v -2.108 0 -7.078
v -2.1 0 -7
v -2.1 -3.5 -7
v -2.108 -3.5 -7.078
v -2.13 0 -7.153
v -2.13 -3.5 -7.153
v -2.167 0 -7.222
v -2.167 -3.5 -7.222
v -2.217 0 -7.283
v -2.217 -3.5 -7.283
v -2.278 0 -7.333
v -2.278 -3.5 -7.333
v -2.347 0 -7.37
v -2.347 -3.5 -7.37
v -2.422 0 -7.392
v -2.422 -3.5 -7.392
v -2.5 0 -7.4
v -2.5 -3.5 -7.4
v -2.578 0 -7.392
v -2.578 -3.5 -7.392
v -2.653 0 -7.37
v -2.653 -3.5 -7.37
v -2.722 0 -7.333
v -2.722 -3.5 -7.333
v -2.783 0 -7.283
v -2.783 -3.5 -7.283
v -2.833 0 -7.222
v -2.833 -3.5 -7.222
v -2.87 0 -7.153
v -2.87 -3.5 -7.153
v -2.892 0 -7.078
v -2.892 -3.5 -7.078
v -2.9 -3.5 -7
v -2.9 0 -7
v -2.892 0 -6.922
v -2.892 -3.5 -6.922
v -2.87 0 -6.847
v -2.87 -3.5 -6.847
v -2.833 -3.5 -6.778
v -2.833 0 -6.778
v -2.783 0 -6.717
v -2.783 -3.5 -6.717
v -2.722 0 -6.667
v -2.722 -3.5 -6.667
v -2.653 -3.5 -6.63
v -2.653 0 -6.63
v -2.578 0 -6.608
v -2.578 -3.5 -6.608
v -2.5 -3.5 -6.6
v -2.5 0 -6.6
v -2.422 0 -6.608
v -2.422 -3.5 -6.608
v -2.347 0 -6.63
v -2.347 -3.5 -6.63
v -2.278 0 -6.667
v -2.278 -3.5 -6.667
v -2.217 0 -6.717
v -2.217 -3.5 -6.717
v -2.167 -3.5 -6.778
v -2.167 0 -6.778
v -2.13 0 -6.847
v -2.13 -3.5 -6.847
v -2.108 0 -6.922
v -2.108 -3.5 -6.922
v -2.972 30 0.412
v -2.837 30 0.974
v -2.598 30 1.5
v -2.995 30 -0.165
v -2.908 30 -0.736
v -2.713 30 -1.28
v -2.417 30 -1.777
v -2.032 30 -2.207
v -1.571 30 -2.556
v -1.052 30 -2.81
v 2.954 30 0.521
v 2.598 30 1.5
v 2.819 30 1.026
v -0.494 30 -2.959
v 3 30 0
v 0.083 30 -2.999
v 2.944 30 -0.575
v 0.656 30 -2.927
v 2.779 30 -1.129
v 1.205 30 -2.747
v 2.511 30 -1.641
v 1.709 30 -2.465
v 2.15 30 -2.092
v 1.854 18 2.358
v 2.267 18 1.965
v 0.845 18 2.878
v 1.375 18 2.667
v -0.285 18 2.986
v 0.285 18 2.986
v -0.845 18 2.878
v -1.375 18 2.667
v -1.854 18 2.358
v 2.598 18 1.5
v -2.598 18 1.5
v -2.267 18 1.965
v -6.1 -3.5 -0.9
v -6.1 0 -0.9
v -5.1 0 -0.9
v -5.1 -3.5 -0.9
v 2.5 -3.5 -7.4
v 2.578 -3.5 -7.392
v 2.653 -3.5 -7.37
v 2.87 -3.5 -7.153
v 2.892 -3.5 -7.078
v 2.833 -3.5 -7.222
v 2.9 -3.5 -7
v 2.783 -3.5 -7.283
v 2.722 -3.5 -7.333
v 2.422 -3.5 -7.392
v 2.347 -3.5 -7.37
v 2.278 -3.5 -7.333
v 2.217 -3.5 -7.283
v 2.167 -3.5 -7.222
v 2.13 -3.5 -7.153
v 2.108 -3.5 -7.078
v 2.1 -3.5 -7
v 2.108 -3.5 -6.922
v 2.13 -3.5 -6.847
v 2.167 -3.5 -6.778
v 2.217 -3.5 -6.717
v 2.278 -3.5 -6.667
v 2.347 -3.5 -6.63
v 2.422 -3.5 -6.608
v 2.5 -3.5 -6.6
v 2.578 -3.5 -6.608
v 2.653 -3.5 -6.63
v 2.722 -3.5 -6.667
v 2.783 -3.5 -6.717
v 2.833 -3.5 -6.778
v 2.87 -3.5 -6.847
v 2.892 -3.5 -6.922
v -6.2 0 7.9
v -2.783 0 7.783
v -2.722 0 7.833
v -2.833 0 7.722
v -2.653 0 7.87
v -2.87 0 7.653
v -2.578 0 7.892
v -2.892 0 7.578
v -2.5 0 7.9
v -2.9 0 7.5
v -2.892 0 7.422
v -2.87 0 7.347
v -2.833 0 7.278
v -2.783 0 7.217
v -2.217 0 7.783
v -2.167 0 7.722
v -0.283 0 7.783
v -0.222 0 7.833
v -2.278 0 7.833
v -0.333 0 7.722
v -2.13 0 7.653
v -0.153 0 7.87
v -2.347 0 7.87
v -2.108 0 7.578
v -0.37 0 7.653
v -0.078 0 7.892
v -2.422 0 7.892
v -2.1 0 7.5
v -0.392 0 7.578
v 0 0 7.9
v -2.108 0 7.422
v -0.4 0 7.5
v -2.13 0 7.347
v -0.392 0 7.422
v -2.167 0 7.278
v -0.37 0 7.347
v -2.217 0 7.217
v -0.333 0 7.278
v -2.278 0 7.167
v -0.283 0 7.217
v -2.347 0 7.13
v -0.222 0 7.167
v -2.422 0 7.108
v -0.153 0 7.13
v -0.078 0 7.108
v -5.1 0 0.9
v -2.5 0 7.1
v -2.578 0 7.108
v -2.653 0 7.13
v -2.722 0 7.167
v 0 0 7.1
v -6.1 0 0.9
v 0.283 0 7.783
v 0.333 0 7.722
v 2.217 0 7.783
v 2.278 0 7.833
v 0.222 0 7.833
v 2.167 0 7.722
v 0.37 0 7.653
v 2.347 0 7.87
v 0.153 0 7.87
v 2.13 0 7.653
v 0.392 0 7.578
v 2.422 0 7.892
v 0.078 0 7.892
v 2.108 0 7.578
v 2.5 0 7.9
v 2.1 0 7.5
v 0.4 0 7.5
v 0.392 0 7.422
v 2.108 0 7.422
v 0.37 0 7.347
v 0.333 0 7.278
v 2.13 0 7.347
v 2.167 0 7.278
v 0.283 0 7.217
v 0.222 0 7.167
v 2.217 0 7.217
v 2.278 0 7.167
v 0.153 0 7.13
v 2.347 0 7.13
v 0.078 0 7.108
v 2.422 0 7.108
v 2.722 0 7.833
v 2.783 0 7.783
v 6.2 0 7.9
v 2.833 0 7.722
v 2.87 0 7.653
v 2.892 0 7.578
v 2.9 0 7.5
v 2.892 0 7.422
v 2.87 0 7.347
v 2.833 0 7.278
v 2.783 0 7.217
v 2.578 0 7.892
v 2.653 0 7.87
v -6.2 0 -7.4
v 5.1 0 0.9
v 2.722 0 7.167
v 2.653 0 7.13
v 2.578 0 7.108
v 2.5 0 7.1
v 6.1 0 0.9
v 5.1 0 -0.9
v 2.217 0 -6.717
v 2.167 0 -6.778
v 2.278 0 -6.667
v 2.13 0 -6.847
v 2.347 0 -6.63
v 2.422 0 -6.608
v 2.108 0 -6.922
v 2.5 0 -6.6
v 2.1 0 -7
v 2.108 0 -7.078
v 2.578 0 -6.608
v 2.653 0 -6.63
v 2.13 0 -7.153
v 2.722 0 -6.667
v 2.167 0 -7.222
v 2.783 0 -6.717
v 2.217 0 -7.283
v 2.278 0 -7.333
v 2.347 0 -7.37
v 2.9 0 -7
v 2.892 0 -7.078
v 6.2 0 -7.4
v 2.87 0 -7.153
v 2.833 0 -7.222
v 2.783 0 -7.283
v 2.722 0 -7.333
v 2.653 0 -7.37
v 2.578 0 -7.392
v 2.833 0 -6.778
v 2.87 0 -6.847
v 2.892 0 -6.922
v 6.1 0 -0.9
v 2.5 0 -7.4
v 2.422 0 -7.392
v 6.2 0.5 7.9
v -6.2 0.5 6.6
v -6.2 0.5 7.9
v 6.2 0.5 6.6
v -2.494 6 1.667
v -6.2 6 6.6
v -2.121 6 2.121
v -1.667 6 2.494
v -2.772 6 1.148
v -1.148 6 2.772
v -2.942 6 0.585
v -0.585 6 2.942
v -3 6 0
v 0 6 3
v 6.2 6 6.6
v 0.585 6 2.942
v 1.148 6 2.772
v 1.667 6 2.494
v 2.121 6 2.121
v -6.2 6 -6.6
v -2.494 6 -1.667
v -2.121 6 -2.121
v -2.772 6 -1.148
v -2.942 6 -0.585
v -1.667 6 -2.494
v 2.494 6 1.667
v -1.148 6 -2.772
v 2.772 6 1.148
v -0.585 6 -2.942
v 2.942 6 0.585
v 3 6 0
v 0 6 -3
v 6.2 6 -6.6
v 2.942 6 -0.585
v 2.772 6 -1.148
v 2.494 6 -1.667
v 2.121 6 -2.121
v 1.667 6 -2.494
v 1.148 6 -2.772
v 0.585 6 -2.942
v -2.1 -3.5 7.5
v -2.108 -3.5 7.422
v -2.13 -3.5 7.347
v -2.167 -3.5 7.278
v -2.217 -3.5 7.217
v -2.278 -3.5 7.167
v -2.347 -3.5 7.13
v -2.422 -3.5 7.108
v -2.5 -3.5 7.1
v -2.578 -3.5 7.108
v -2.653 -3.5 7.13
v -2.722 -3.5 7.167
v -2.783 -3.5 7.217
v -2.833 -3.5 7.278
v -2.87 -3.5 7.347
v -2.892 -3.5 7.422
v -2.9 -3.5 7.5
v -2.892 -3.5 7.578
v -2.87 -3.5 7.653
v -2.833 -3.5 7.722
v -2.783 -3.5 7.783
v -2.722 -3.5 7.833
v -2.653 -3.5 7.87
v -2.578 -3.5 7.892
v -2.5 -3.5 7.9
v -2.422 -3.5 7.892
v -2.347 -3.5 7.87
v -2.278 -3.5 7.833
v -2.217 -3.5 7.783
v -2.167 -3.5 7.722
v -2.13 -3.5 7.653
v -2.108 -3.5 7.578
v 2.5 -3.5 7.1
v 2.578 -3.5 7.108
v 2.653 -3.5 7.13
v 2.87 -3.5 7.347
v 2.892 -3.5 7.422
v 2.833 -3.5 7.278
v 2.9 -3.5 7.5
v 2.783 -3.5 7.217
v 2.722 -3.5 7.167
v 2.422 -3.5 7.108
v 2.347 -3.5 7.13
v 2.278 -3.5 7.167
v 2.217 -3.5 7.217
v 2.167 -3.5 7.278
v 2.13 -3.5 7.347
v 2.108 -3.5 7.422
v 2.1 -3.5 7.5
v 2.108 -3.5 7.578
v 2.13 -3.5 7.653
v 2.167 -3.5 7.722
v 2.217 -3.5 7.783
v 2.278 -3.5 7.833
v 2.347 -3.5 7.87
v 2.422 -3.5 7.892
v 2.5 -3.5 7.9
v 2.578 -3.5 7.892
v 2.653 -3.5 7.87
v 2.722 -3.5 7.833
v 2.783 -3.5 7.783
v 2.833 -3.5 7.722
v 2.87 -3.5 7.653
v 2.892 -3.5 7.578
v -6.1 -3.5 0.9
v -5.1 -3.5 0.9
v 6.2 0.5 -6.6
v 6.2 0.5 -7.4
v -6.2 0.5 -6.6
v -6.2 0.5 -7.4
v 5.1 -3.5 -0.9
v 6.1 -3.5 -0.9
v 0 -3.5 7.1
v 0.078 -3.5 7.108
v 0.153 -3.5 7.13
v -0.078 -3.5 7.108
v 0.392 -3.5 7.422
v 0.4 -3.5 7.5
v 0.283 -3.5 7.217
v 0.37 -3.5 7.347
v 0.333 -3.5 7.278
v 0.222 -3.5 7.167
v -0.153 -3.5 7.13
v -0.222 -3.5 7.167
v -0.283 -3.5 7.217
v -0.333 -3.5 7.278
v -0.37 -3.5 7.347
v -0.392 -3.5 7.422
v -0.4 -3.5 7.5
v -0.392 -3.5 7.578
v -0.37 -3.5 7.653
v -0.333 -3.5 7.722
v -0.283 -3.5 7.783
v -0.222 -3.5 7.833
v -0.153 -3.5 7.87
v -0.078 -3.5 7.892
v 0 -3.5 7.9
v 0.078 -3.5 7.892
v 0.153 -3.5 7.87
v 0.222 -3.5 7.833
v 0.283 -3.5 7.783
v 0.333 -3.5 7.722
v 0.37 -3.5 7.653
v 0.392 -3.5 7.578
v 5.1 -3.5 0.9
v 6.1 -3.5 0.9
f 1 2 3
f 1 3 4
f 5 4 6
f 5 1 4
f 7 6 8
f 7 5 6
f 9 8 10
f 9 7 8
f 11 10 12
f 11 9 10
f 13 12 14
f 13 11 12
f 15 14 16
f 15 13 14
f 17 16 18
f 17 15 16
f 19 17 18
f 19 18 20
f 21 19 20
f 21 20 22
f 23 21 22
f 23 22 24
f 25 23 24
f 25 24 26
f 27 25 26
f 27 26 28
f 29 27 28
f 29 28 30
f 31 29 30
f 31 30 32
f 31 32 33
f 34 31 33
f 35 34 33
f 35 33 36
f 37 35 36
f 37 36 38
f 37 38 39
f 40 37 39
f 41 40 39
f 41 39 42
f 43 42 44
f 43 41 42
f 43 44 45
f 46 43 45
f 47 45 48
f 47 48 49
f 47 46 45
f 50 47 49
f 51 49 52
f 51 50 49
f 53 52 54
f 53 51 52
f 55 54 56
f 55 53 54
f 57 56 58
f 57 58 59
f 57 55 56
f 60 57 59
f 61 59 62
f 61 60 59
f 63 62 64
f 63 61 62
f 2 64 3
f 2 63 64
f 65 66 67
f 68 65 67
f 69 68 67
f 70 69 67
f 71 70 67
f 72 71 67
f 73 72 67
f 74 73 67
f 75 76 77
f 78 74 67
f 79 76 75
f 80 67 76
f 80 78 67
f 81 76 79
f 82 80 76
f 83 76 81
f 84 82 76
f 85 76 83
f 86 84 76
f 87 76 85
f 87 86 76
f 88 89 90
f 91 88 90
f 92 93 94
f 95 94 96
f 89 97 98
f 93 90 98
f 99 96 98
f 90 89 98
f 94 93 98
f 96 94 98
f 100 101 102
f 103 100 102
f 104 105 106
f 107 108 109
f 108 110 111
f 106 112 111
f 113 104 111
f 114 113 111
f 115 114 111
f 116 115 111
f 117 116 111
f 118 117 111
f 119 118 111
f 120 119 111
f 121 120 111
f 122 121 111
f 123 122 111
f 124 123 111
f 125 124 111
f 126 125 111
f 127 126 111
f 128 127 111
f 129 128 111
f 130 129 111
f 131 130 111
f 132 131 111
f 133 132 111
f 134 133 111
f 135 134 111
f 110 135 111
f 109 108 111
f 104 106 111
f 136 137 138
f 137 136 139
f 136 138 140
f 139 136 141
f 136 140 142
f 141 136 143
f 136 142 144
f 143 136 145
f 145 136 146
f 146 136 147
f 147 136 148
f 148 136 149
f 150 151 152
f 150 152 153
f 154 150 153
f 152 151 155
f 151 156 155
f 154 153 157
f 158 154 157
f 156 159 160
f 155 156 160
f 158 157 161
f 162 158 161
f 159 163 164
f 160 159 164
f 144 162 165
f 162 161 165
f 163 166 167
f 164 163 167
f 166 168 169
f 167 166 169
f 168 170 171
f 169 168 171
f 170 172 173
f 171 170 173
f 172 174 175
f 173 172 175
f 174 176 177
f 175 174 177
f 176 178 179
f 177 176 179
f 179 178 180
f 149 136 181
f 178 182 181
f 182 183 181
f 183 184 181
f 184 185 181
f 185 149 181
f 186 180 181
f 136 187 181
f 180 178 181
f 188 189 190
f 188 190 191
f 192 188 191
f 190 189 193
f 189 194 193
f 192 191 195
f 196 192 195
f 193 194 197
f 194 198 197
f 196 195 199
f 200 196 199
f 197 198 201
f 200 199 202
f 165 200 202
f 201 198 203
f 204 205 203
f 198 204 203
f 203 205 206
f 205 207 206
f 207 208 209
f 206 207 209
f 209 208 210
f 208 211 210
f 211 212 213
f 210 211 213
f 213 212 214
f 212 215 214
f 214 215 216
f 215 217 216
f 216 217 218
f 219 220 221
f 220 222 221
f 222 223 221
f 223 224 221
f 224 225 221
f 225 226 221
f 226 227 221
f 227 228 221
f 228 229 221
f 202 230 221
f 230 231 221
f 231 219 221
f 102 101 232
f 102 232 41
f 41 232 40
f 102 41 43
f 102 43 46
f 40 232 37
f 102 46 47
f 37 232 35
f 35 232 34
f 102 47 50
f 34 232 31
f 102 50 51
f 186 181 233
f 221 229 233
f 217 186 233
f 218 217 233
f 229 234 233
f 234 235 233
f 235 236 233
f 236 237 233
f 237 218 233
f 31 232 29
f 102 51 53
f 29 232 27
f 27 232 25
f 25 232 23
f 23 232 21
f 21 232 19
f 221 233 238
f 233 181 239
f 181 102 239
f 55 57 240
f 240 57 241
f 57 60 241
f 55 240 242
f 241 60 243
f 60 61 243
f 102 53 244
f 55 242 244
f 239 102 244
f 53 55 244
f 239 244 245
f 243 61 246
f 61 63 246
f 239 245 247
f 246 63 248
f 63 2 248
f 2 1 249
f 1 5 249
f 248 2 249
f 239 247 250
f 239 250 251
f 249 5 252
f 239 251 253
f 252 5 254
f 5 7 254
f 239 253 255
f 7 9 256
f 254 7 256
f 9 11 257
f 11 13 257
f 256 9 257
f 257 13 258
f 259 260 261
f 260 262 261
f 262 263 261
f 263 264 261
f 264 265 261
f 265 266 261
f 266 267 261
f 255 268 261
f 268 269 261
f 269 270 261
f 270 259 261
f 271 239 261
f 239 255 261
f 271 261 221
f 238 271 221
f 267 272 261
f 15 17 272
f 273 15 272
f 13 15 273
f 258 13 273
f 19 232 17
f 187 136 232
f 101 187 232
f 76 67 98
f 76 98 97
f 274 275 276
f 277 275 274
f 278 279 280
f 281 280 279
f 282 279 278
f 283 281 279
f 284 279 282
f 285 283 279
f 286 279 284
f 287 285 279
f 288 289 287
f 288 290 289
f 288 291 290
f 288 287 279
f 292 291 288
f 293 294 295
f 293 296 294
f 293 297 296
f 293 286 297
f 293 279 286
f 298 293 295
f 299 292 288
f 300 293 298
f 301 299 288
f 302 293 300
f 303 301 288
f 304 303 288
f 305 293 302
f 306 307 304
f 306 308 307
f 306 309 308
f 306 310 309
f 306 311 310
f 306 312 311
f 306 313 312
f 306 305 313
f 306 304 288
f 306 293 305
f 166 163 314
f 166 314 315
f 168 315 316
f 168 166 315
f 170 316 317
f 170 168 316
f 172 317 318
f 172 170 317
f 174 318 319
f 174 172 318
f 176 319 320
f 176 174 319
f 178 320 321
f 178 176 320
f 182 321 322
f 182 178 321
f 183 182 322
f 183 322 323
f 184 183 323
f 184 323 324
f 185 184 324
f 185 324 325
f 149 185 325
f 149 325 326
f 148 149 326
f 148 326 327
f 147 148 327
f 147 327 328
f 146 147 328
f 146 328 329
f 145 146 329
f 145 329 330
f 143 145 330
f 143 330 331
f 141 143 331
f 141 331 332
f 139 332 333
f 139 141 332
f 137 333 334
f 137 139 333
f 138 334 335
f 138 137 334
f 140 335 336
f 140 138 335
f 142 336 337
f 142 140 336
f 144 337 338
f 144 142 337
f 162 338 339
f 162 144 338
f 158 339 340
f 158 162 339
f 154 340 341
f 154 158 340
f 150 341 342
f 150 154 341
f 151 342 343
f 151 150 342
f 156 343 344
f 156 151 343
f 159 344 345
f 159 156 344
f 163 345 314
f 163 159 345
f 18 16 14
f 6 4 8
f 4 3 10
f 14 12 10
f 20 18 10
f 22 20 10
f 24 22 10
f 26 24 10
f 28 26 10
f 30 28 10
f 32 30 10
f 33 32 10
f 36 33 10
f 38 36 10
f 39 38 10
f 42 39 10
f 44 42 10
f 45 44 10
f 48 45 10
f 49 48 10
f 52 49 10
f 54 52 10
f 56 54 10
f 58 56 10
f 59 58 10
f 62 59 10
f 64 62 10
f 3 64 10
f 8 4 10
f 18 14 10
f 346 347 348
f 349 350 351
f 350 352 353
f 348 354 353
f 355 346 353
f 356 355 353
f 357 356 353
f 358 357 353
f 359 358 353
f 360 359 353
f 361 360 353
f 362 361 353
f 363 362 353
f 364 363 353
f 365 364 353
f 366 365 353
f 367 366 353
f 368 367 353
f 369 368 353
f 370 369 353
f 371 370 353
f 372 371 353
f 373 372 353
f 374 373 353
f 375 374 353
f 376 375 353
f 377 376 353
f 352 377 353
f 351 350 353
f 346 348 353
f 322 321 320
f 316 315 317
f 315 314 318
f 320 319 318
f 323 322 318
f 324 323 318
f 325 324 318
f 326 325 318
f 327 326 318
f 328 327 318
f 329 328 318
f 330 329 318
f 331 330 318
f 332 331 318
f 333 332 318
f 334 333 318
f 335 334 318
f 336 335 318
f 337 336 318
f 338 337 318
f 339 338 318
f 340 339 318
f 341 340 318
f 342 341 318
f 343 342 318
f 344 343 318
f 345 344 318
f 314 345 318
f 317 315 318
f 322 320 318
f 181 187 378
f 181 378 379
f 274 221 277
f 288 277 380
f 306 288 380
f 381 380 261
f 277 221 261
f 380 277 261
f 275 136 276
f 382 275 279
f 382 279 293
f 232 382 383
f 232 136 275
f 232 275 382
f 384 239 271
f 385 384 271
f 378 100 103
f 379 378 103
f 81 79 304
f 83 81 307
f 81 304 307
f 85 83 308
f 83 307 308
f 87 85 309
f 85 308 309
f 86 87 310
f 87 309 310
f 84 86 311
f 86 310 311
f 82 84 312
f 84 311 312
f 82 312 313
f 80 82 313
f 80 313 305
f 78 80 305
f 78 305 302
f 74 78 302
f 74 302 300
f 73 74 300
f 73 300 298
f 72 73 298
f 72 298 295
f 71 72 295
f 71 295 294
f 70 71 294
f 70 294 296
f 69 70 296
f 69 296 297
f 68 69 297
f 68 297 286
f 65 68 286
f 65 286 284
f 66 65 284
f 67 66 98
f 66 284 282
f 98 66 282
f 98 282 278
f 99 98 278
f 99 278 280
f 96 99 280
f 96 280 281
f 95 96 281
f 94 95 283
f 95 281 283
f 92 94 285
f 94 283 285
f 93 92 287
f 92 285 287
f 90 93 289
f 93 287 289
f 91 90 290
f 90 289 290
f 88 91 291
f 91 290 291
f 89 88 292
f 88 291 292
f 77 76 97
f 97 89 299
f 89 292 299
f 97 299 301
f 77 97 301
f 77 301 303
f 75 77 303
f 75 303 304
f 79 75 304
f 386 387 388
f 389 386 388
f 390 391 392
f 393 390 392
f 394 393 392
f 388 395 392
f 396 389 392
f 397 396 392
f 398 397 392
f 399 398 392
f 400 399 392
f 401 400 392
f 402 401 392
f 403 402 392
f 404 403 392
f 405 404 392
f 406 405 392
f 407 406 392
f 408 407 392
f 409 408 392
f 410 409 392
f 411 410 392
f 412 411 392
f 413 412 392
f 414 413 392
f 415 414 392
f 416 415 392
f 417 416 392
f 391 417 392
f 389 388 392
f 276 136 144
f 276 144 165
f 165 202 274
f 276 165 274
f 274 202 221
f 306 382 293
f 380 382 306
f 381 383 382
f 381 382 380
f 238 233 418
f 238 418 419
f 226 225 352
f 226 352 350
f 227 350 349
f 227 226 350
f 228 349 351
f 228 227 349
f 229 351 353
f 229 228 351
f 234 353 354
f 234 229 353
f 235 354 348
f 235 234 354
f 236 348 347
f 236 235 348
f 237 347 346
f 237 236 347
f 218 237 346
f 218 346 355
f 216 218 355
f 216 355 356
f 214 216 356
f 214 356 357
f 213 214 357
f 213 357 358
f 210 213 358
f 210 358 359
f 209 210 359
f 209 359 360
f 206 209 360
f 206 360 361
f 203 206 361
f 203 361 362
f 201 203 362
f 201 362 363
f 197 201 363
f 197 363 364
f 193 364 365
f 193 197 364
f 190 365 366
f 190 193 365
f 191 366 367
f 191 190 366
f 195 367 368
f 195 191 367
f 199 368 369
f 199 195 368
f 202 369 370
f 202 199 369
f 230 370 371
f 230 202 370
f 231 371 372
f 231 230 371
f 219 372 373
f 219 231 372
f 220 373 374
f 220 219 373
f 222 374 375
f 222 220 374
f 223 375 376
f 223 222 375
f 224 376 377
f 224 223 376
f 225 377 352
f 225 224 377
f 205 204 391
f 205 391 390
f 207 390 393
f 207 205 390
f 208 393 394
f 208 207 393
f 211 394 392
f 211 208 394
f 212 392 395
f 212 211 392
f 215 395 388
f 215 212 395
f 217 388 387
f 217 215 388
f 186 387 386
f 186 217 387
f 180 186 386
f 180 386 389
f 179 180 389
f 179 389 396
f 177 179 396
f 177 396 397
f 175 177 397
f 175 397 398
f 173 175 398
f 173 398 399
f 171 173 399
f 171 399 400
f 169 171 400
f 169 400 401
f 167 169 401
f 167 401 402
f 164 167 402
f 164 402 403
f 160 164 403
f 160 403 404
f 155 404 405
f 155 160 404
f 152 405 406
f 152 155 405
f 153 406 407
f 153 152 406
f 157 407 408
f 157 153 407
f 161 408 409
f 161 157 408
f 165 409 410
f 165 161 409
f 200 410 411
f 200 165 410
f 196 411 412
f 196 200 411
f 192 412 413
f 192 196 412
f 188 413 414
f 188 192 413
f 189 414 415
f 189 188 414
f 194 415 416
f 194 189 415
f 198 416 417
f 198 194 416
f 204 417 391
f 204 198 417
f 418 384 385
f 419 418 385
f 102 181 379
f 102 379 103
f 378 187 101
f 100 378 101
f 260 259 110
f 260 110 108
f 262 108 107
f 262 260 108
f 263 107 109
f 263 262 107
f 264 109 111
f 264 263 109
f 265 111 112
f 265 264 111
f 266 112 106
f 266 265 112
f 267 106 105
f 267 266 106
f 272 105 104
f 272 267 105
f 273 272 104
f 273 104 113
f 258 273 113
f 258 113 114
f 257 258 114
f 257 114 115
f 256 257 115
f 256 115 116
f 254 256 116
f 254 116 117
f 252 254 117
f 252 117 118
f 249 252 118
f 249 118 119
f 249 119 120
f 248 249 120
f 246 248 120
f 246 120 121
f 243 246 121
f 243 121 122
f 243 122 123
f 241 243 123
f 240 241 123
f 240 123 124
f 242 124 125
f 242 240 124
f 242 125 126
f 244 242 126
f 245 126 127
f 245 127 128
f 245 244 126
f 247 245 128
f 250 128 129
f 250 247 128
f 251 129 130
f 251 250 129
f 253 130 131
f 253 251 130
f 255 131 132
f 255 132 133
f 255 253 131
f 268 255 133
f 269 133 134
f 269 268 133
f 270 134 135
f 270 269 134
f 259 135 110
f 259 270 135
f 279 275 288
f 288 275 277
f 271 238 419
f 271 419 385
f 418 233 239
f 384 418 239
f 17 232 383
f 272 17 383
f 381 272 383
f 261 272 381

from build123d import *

# Parameters (mm, degrees)
SKETCH1_R             = 0.4
BOSS_EXTRUDE1_DEPTH   = 3.5
BOSS_EXTRUDE1_2_DEPTH = 3.5
BOSS_EXTRUDE1_3_DEPTH = 3.5
BOSS_EXTRUDE1_4_DEPTH = 3.5
BOSS_EXTRUDE1_5_DEPTH = 3.5
SKETCH1_W             = 1
SKETCH1_H             = 1.8
BOSS_EXTRUDE1_6_DEPTH = 3.5
BOSS_EXTRUDE1_7_DEPTH = 3.5
SKETCH2_W             = 12.4
SKETCH2_H             = 13.2
BOSS_EXTRUDE2_DEPTH   = 6
SKETCH3_W             = 12.4
SKETCH3_H             = 15.3
BOSS_EXTRUDE3_DEPTH   = 0.5
SKETCH4_R             = 3
BOSS_EXTRUDE4_DEPTH   = 24
CUT_EXTRUDE1_DEPTH    = 12


with BuildPart() as part:
    # Sketch1 → Boss-Extrude1 (new body)
    with BuildSketch(Plane(origin=(0, 0, 0), x_dir=(1, 0, 0), z_dir=(0, 1, 0))):
        with Locations((-2.5, -7.5)):
            Circle(SKETCH1_R)
    extrude(amount=-BOSS_EXTRUDE1_DEPTH)



with BuildPart() as body_2:
    # Sketch1 → Boss-Extrude1 2 (new body)
    with BuildSketch(Plane(origin=(0, 0, 0), x_dir=(1, 0, 0), z_dir=(0, 1, 0))):
        with Locations((0, -7.5)):
            Circle(SKETCH1_R)
    extrude(amount=-BOSS_EXTRUDE1_2_DEPTH)


with BuildPart() as body_3:
    # Sketch1 → Boss-Extrude1 3 (new body)
    with BuildSketch(Plane(origin=(0, 0, 0), x_dir=(1, 0, 0), z_dir=(0, 1, 0))):
        with Locations((2.5, -7.5)):
            Circle(SKETCH1_R)
    extrude(amount=-BOSS_EXTRUDE1_3_DEPTH)


with BuildPart() as body_4:
    # Sketch1 → Boss-Extrude1 4 (new body)
    with BuildSketch(Plane(origin=(0, 0, 0), x_dir=(1, 0, 0), z_dir=(0, 1, 0))):
        with Locations((2.5, 7)):
            Circle(SKETCH1_R)
    extrude(amount=-BOSS_EXTRUDE1_4_DEPTH)


with BuildPart() as body_5:
    # Sketch1 → Boss-Extrude1 5 (new body)
    with BuildSketch(Plane(origin=(0, 0, 0), x_dir=(1, 0, 0), z_dir=(0, 1, 0))):
        with Locations((-2.5, 7)):
            Circle(SKETCH1_R)
    extrude(amount=-BOSS_EXTRUDE1_5_DEPTH)


with BuildPart() as body_6:
    # Sketch1 → Boss-Extrude1 6 (new body)
    with BuildSketch(Plane(origin=(0, 0, 0), x_dir=(1, 0, 0), z_dir=(0, 1, 0))):
        with Locations((-5.6, 0)):
            Rectangle(SKETCH1_W, SKETCH1_H)
    extrude(amount=-BOSS_EXTRUDE1_6_DEPTH)



with BuildPart() as body_7:
    # Sketch1 → Boss-Extrude1 7 (new body)
    with BuildSketch(Plane(origin=(0, 0, 0), x_dir=(1, 0, 0), z_dir=(0, 1, 0))):
        with Locations((5.6, 0)):
            Rectangle(SKETCH1_W, SKETCH1_H)
    extrude(amount=-BOSS_EXTRUDE1_7_DEPTH)


with BuildPart() as body_6_1:
    add(body_6.part)

    add(body_7.part)  # Boss-Extrude2 merges body 7
    # Sketch2 → Boss-Extrude2 (add)
    with BuildSketch(Plane(origin=(0, 0, 0), x_dir=(1, 0, 0), z_dir=(0, 1, 0))):
        Rectangle(SKETCH2_W, SKETCH2_H)
    extrude(amount=BOSS_EXTRUDE2_DEPTH)


with BuildPart() as part_1:
    add(part.part)

    add(body_2.part)  # Boss-Extrude3 merges body 2

    add(body_3.part)  # Boss-Extrude3 merges body 3

    add(body_4.part)  # Boss-Extrude3 merges body 4

    add(body_5.part)  # Boss-Extrude3 merges body 5

    add(body_6_1.part)  # Boss-Extrude3 merges body 6
    # Sketch3 → Boss-Extrude3 (add)
    with BuildSketch(Plane(origin=(0, 0, 0), x_dir=(1, 0, 0), z_dir=(0, 1, 0))):
        with Locations((0, -0.25)):
            Rectangle(SKETCH3_W, SKETCH3_H)
    extrude(amount=BOSS_EXTRUDE3_DEPTH)

    # Sketch4 → Boss-Extrude4 (add)
    with BuildSketch(Plane(origin=(0, 6, 0), x_dir=(1, 0, 0), z_dir=(0, 1, 0))):
        Circle(SKETCH4_R)
    extrude(amount=BOSS_EXTRUDE4_DEPTH)

    # Sketch5 → Cut-Extrude1 (cut)
    with BuildSketch(Plane(origin=(0, 30, 0), x_dir=(1, 0, 0), z_dir=(0, 1, 0))):
        with BuildLine():
            Line((-2.598076211, -1.5), (2.598076211, -1.5))
            ThreePointArc((2.598076211, -1.5), (0, -3), (-2.598076211, -1.5))
        make_face()
    extrude(amount=-CUT_EXTRUDE1_DEPTH, mode=Mode.SUBTRACT)


solid = part_1.part
